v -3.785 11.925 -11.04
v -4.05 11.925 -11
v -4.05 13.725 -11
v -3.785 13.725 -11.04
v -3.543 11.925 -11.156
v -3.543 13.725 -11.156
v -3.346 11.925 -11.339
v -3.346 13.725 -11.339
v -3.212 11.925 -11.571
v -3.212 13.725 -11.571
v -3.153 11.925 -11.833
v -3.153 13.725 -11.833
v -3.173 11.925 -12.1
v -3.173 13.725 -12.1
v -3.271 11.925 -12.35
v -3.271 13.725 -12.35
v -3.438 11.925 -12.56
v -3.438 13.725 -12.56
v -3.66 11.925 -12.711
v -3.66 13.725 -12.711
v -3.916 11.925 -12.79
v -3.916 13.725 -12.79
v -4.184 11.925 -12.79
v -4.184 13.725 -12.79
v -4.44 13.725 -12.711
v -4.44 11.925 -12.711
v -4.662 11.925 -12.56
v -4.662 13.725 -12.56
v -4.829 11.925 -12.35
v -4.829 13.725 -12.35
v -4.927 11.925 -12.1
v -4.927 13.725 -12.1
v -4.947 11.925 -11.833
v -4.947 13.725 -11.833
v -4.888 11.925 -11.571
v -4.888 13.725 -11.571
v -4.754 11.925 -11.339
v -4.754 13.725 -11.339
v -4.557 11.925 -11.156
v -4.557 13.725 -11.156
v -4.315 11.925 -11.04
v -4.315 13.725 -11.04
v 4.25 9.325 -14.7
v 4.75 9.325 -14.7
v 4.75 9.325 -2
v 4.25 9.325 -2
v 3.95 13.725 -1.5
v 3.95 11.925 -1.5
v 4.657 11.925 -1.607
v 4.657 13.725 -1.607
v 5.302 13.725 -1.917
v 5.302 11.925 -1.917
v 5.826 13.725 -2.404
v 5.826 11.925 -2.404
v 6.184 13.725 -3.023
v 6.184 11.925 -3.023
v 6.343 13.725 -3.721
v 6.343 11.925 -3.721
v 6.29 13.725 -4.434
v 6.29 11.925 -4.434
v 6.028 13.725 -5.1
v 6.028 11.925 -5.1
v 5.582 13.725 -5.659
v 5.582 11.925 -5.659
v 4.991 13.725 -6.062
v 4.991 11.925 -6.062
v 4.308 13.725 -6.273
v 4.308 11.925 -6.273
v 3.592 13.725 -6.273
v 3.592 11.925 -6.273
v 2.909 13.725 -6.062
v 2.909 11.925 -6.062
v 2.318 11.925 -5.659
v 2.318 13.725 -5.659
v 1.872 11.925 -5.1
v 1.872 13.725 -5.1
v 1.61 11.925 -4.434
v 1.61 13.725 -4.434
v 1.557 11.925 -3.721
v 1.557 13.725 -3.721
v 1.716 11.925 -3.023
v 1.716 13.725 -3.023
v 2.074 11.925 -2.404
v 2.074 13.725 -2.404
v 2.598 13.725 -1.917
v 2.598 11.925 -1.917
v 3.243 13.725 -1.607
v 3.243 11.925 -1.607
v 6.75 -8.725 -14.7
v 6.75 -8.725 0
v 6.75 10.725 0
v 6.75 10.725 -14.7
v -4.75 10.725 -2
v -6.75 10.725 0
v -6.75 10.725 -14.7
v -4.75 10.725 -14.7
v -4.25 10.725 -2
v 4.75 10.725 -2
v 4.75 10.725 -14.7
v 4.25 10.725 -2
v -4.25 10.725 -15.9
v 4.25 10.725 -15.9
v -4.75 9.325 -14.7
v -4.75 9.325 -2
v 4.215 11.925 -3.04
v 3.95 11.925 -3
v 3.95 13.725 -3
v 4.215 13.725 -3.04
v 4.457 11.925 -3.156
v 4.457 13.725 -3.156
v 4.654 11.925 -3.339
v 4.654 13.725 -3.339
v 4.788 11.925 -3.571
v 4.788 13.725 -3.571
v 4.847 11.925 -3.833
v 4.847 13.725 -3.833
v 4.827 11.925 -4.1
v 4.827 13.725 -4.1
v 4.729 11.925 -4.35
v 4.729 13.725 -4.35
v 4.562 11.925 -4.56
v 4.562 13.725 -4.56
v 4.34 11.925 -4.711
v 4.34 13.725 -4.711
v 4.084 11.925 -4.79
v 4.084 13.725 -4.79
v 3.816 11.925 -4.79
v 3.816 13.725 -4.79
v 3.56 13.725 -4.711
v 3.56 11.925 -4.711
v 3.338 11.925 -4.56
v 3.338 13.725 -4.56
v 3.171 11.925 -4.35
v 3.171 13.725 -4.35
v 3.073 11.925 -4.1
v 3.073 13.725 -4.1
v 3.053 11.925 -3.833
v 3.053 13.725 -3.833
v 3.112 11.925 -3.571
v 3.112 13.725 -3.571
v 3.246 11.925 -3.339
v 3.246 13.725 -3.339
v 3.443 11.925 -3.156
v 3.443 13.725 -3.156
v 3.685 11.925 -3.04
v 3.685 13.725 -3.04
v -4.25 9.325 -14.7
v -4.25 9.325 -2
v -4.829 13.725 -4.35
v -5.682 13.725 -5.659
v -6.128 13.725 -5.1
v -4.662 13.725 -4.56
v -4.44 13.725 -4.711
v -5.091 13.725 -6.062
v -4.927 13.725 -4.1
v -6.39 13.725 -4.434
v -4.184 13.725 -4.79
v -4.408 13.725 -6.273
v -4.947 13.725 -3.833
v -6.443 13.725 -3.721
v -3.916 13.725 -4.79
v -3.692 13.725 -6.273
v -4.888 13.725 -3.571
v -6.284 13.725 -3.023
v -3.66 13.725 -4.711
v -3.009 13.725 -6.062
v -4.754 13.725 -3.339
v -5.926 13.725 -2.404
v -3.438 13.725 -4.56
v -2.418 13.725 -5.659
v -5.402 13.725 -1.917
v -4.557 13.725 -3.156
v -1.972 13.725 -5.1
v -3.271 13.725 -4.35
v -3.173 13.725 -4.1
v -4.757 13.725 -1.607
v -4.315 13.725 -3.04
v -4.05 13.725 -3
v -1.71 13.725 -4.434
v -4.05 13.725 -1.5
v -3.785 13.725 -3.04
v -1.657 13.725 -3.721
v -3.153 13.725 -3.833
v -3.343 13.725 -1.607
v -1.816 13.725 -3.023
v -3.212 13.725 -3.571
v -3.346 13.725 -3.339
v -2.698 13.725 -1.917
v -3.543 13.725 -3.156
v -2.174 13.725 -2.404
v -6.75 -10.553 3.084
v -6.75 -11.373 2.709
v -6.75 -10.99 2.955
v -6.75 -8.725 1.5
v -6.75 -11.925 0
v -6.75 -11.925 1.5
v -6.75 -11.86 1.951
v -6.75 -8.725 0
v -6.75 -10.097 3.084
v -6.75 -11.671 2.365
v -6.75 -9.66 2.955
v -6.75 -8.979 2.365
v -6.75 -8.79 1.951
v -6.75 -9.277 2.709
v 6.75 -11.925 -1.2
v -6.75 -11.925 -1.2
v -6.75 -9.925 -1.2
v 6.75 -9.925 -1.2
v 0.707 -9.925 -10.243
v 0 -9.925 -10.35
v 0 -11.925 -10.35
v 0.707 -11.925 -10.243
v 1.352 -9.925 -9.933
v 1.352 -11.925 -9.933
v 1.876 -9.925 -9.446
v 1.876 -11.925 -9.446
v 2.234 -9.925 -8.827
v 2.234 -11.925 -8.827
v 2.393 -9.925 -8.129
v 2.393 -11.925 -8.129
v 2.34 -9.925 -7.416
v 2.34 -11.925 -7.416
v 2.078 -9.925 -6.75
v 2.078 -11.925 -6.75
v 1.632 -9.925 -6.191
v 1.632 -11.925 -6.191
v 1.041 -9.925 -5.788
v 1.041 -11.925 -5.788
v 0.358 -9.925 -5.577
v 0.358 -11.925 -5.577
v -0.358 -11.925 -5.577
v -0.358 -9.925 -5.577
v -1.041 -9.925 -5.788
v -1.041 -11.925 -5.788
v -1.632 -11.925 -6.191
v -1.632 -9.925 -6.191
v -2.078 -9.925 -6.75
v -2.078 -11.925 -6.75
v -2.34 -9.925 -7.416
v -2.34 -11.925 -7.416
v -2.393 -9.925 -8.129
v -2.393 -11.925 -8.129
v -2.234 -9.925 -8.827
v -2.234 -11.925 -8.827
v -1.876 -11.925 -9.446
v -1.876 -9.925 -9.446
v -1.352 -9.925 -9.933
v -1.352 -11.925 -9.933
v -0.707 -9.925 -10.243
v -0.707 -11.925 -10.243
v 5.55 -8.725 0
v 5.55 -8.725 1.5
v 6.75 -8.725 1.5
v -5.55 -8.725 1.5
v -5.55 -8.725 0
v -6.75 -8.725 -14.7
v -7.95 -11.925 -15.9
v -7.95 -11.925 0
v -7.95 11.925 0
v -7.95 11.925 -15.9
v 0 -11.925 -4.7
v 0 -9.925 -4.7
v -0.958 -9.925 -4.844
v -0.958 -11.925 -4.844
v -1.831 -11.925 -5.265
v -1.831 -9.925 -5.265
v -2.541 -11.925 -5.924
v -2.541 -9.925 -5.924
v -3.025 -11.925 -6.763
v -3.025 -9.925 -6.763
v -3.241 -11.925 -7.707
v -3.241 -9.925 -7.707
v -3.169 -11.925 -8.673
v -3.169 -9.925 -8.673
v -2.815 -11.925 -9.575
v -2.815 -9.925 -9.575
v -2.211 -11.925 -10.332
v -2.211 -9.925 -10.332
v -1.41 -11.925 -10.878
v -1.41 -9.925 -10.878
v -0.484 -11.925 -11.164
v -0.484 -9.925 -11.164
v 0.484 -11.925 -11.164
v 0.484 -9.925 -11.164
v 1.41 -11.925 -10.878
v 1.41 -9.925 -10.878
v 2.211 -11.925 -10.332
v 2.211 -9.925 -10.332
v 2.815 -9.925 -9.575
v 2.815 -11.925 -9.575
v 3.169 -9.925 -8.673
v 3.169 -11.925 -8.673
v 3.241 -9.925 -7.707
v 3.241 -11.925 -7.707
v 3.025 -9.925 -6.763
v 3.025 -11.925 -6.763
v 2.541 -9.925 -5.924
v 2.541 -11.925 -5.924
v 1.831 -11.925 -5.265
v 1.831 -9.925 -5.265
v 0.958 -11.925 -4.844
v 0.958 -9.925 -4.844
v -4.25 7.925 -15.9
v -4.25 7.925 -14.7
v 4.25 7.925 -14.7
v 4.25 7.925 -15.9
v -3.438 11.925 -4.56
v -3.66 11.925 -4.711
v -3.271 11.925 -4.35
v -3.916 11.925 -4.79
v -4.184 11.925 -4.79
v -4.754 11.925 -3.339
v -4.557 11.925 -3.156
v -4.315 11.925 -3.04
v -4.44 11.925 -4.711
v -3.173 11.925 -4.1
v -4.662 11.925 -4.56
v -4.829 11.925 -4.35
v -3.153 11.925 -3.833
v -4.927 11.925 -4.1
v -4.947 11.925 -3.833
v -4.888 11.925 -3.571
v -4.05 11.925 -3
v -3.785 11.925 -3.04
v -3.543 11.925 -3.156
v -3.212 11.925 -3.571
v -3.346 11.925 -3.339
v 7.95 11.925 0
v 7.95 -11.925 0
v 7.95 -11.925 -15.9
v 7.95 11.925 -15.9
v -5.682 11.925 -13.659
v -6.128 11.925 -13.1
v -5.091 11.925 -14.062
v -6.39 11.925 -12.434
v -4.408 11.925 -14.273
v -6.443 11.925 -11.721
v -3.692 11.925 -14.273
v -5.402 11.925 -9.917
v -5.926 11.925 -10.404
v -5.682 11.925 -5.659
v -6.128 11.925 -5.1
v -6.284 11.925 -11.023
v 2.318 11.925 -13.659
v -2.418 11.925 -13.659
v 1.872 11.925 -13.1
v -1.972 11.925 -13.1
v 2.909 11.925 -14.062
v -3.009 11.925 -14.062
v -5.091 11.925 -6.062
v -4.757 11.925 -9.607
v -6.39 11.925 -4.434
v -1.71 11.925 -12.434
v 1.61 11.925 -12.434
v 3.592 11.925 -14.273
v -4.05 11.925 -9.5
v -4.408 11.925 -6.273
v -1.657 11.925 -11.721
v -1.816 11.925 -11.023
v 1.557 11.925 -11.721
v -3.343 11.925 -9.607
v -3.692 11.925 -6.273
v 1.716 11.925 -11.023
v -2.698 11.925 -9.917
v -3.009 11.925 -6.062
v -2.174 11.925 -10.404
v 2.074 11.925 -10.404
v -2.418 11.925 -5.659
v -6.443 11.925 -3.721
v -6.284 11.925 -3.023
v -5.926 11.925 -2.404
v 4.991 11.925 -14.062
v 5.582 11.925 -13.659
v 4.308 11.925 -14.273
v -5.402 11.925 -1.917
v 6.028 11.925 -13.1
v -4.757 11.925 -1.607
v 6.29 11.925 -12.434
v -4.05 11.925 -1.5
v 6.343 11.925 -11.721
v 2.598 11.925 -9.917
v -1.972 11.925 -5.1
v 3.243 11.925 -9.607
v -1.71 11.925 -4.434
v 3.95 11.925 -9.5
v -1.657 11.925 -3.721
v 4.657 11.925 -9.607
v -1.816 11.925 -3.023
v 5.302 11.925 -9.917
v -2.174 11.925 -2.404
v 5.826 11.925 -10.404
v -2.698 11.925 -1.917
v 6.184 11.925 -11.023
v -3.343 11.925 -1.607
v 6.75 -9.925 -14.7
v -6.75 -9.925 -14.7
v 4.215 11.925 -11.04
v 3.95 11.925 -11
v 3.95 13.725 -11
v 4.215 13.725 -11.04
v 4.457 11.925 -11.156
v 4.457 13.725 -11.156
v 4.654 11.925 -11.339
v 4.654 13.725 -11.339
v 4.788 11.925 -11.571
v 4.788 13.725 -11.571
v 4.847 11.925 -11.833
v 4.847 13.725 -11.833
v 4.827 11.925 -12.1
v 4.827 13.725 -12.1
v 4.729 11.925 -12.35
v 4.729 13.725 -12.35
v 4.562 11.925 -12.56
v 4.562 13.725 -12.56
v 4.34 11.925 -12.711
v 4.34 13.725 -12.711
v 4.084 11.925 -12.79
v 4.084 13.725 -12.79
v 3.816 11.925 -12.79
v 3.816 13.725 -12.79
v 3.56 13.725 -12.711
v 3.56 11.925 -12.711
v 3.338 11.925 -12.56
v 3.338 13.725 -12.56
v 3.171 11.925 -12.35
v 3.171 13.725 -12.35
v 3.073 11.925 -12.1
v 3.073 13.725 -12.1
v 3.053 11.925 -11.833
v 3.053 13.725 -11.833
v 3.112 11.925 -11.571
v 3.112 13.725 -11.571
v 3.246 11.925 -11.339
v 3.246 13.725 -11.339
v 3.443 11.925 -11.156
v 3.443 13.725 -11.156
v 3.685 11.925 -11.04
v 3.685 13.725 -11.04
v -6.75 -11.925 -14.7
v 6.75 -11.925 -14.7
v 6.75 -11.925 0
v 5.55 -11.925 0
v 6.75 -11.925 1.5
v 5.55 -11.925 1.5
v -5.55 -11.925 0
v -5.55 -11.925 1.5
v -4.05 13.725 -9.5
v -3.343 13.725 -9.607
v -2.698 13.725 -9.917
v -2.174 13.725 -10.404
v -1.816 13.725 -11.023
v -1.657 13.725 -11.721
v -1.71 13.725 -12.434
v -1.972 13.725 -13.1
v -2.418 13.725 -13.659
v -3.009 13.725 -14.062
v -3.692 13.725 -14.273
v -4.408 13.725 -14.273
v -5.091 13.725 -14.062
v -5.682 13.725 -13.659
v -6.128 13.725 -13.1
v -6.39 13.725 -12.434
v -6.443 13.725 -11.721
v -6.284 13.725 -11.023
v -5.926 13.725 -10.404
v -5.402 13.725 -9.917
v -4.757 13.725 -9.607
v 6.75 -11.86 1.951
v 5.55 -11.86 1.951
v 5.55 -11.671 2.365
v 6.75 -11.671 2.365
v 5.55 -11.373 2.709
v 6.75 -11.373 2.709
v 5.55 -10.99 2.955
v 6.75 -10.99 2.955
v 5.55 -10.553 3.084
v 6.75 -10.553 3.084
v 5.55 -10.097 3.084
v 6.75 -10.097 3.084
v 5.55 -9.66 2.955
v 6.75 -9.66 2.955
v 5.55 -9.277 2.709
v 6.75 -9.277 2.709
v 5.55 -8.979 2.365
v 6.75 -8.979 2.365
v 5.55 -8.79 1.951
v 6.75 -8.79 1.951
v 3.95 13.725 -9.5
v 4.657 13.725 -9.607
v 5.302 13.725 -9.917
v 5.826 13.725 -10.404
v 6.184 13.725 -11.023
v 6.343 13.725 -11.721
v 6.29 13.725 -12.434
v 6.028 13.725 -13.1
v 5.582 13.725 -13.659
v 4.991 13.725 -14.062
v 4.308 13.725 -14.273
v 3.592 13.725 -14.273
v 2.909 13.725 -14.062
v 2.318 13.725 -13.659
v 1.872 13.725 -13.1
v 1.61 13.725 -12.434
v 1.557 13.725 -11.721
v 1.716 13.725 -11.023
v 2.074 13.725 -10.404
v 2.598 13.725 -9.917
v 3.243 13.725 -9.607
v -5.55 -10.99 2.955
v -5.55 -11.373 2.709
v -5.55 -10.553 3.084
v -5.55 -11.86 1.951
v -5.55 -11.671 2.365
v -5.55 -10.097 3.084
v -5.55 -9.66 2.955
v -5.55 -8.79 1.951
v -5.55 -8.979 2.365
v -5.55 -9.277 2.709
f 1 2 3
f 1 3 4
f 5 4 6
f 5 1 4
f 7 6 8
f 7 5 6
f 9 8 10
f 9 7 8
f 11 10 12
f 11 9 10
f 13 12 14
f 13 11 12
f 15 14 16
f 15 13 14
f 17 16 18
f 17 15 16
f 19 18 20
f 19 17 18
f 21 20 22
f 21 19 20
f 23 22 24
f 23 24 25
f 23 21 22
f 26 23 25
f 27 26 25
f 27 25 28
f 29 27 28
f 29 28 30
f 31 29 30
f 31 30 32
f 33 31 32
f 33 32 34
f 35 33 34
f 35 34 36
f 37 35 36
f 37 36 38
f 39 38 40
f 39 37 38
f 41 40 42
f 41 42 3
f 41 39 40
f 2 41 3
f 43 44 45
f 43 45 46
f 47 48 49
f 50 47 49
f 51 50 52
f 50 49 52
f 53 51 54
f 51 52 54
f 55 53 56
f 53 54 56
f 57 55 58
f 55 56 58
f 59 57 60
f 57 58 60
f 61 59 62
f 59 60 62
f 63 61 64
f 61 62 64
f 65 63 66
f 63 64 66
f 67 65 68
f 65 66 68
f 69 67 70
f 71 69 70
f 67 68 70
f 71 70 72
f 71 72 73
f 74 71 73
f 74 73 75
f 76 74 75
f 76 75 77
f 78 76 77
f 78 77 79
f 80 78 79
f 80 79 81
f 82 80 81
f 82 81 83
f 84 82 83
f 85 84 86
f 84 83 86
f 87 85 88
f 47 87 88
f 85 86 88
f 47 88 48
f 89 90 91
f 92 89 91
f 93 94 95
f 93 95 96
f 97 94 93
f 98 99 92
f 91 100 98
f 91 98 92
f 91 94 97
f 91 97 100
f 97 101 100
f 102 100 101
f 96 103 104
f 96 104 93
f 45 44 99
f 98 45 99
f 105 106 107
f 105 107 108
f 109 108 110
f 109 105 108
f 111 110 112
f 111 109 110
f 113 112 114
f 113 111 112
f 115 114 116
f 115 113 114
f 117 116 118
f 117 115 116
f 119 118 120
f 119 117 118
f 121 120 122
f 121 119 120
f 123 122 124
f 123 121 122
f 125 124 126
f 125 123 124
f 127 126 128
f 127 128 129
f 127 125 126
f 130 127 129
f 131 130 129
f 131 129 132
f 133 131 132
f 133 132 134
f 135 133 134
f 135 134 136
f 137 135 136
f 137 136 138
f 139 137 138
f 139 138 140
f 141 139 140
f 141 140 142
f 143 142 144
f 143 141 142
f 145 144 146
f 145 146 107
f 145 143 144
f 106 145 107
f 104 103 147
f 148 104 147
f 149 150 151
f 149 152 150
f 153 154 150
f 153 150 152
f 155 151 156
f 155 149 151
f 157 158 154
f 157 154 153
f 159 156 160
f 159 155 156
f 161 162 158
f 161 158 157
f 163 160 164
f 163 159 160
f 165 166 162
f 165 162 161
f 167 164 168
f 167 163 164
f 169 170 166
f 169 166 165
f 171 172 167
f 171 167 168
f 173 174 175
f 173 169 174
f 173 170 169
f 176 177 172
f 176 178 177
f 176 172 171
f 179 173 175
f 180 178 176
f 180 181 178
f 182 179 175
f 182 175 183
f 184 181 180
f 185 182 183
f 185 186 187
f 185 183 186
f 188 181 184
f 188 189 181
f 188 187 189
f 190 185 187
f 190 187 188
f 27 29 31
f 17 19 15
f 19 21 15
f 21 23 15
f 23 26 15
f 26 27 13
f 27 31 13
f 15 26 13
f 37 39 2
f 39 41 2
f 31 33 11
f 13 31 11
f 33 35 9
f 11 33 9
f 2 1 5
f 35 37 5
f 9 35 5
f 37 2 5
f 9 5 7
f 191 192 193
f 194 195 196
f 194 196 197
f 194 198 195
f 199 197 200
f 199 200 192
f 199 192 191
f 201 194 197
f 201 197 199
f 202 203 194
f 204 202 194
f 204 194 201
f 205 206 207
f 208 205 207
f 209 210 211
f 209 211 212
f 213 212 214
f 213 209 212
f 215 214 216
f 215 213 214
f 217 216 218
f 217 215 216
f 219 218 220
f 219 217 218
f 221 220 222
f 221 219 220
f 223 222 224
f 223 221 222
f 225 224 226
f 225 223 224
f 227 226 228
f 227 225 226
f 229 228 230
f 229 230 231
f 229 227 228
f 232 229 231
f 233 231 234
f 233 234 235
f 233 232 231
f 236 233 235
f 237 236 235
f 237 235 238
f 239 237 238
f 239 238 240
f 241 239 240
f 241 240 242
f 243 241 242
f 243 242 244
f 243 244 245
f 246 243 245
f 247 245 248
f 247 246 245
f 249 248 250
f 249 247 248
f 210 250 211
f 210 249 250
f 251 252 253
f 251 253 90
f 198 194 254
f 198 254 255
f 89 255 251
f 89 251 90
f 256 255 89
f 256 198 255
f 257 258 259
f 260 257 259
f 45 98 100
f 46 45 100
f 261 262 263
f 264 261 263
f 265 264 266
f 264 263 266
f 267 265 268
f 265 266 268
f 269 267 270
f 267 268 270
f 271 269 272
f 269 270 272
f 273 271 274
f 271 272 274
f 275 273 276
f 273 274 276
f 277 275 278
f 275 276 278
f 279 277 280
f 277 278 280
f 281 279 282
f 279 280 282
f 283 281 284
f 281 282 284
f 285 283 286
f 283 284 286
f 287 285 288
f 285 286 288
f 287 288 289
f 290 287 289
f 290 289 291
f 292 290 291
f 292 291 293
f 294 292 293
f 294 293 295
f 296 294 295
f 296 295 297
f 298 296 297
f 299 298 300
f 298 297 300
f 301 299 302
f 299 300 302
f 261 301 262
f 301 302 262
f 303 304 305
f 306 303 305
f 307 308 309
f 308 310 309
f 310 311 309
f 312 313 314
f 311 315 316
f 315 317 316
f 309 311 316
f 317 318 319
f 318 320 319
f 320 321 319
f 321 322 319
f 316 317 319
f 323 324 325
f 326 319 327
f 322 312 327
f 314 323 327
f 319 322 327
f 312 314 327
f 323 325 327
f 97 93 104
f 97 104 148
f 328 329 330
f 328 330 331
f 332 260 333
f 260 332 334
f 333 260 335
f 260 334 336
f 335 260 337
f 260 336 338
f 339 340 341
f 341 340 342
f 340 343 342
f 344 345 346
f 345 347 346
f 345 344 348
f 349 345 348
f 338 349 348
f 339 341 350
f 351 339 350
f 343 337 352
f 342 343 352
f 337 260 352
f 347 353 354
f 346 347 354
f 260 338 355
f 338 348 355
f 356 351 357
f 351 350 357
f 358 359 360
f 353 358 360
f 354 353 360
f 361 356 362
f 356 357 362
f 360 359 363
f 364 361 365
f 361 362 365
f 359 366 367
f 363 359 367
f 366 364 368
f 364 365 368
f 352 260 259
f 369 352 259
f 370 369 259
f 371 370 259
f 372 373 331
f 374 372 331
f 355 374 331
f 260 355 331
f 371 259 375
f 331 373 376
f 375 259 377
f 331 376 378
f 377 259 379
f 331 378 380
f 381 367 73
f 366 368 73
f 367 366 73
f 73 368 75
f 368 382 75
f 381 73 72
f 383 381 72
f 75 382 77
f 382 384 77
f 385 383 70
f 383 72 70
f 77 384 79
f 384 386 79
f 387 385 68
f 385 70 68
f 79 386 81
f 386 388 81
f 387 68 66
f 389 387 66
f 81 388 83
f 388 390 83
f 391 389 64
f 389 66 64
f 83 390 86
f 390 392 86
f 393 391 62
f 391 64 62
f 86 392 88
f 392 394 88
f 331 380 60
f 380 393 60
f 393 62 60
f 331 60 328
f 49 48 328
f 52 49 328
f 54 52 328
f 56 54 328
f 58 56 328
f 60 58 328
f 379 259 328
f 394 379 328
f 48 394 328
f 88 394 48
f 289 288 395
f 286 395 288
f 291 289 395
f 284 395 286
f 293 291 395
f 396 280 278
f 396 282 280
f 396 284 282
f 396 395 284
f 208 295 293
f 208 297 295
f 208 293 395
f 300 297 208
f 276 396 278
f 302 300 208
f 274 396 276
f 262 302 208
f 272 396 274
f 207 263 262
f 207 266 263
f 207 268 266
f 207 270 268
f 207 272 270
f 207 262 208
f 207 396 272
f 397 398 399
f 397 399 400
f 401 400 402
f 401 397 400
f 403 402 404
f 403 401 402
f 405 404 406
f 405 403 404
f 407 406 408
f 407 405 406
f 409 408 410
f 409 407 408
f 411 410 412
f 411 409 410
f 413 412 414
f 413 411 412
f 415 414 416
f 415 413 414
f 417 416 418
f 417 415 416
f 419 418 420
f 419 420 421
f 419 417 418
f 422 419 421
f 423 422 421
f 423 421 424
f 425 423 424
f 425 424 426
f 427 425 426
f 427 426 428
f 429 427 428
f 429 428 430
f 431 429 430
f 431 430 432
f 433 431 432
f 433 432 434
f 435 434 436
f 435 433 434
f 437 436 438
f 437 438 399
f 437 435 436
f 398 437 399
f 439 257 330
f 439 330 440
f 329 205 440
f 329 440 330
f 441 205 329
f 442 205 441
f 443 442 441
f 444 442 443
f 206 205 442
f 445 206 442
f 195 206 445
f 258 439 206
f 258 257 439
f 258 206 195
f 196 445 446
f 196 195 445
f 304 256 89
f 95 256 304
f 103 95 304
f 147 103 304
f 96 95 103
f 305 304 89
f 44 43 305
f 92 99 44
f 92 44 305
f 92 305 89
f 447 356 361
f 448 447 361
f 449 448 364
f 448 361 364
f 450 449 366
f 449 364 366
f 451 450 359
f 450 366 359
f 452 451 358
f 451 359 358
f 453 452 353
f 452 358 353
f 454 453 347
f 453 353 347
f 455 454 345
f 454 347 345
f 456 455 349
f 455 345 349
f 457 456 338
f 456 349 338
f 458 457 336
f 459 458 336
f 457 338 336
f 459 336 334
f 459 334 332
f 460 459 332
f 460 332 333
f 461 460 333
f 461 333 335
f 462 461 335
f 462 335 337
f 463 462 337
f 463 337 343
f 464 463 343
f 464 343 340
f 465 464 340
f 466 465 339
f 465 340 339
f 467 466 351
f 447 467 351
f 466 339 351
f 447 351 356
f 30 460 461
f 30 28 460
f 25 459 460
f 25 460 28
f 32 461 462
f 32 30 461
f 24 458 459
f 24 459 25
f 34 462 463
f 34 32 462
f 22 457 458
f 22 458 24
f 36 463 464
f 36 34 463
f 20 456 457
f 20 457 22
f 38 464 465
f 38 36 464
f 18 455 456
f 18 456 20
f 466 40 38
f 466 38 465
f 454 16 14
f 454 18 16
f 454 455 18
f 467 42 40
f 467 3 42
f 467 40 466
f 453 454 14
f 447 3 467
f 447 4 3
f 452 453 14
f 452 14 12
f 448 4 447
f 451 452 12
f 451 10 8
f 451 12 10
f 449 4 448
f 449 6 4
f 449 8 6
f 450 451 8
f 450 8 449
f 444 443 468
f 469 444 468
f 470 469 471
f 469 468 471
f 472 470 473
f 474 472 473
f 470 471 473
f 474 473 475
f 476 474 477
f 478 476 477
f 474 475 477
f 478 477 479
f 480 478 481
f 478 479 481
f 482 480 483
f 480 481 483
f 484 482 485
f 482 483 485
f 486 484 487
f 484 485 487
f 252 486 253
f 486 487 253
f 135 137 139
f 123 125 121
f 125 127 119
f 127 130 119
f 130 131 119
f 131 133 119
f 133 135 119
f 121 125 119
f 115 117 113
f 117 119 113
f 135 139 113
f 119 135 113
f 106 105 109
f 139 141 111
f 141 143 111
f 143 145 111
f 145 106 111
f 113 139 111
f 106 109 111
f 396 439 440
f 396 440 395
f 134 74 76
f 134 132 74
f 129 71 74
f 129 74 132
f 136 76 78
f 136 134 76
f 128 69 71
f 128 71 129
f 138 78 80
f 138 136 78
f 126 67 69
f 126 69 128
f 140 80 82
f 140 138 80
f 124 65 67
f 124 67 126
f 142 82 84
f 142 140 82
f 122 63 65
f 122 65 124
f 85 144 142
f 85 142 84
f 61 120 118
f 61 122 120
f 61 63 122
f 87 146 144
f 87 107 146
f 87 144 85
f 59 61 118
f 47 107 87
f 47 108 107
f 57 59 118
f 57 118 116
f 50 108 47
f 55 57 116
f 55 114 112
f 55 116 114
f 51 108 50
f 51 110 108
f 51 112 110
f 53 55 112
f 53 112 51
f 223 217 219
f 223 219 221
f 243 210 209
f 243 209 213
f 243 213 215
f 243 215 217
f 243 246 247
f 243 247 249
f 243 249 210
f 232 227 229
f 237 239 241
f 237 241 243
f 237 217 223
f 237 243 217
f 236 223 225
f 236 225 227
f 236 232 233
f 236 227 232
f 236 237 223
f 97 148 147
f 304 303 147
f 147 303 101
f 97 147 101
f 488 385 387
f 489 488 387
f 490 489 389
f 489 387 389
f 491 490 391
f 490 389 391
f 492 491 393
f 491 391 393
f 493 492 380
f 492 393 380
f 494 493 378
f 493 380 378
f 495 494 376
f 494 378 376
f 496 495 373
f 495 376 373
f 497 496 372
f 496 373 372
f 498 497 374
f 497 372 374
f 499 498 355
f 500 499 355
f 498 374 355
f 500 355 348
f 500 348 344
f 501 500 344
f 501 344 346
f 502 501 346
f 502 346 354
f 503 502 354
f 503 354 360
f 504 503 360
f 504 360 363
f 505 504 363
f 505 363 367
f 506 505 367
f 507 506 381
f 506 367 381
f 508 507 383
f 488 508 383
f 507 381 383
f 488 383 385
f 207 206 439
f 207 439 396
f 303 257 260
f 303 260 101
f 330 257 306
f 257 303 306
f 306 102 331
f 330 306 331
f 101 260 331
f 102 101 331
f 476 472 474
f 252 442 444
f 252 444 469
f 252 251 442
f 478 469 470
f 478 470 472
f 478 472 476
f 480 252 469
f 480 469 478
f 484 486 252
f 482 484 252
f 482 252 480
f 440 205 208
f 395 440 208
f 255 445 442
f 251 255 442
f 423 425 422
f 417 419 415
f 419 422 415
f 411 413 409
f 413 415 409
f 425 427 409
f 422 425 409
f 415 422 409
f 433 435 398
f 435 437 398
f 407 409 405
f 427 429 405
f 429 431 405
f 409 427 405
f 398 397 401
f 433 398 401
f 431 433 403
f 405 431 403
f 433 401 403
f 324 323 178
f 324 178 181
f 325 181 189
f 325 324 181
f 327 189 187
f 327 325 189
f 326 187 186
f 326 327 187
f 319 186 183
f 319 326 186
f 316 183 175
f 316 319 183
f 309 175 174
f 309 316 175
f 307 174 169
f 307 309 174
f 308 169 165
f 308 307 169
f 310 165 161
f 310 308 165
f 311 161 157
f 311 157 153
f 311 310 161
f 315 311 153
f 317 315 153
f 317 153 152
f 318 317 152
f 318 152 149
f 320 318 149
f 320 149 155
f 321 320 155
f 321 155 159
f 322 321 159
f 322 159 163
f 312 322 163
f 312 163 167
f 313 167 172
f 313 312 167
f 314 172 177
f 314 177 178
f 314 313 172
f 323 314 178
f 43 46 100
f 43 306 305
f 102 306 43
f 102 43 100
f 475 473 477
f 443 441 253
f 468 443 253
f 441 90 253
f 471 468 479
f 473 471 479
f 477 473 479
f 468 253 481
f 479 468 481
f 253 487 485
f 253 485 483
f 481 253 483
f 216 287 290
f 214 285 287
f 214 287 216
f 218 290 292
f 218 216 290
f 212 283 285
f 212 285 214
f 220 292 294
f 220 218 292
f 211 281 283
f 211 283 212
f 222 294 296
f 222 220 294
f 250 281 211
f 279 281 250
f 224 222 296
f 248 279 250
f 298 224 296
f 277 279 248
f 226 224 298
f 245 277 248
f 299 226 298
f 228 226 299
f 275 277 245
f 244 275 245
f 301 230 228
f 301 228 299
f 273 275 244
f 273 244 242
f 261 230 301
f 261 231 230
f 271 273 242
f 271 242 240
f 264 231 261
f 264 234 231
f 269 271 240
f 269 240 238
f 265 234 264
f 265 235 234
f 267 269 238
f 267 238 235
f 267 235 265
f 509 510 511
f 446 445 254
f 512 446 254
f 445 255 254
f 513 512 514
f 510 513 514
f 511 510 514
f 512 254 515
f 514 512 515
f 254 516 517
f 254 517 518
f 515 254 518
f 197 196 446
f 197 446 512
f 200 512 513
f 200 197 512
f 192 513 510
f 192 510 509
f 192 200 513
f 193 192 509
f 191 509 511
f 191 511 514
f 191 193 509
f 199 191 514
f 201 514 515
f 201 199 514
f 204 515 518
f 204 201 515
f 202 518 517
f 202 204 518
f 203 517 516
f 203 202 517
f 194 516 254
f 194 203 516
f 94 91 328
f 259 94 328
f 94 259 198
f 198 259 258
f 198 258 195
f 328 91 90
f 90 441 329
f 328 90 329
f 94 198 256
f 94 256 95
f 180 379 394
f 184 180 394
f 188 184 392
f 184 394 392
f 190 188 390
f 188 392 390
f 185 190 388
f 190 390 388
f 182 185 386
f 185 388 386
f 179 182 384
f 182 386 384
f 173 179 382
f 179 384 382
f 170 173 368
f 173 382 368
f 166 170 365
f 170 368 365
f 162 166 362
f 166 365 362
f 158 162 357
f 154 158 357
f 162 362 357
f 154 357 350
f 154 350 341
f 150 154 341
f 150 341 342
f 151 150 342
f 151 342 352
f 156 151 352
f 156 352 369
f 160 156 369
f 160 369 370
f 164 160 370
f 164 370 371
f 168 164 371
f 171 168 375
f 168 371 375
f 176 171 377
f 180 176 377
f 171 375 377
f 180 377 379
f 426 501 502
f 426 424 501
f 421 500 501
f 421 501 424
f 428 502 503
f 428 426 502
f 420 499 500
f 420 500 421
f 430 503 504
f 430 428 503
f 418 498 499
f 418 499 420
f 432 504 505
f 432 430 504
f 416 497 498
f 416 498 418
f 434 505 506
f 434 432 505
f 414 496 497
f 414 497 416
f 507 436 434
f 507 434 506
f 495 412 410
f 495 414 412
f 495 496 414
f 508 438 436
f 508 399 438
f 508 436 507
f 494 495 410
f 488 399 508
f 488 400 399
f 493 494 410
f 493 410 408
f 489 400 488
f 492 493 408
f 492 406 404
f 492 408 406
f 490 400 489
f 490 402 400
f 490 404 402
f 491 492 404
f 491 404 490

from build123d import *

# Parameters (mm, degrees)
SKETCH1_W            = 15.9
SKETCH1_H            = 23.85
BOSS_EXTRUDE1_DEPTH  = 15.9
SHELL2_T             = -1.2
SKETCH7_W            = 13.5
SKETCH7_H            = 14.7
BOSS_EXTRUDE4_DEPTH  = 2
SHELL3_START         = -6.75
SHELL3_OUTLINE_W     = 2
SHELL3_OUTLINE_H     = 13.5
SHELL3_DEPTH         = 13.5
BOSS_EXTRUDE3_DEPTH  = 1.2
SKETCH8_W            = 8.5
SKETCH8_H            = 2.8
CUT_EXTRUDE2_DEPTH   = 23.852748741
SKETCH9_W            = 0.5
SKETCH9_H            = 1.4
BOSS_EXTRUDE5_DEPTH  = 12.7
SKETCH10_R           = 3.25
SKETCH10_R_2         = 2.4
BOSS_EXTRUDE6_DEPTH  = 2
SKETCH11_R           = 2.4
SKETCH11_R_2         = 0.9
BOSS_EXTRUDE7_DEPTH  = 1.8
LPATTERN1_COUNT      = 2
LPATTERN1_PITCH      = 8
LPATTERN1_COUNT_DIR2 = 2
LPATTERN1_PITCH_DIR2 = 8


# Read off the part's stored shape, not the designer's step: Shell3
with BuildPart() as part:
    # Sketch1 → Boss-Extrude1 (new body)
    with BuildSketch(Plane.XY):
        Rectangle(SKETCH1_W, SKETCH1_H)
    extrude(amount=-BOSS_EXTRUDE1_DEPTH)

    # Shell2
    shell2_openings = [part.faces().sort_by_distance(p)[0] for p in [
        (0, 0, 0),
    ]]
    offset(amount=SHELL2_T, openings=shell2_openings, kind=Kind.INTERSECTION)

    # Sketch7 → Boss-Extrude4 (add)
    with BuildSketch(Plane(origin=(0, -10.725, 0), x_dir=(1, 0, 0), z_dir=(0, 1, 0))):
        with Locations((0, 7.35)):
            Rectangle(SKETCH7_W, SKETCH7_H)
    extrude(amount=BOSS_EXTRUDE4_DEPTH)

    # Shell3 outline → Shell3 (cut)
    with BuildSketch(Plane.YZ.offset(SHELL3_START)):
        with Locations((-10.925, -7.95)):
            Rectangle(SHELL3_OUTLINE_W, SHELL3_OUTLINE_H)
    extrude(amount=SHELL3_DEPTH, mode=Mode.SUBTRACT)

    # Sketch5 → Boss-Extrude3 (add)
    with BuildSketch(Plane(origin=(6.75, 0, 0), x_dir=(0, 0, -1), z_dir=(1, 0, 0))):
        with BuildLine():
            Line((0, -11.925), (-1.5, -11.925))
            ThreePointArc((-1.5, -11.925), (-3.1, -10.325), (-1.5, -8.725))
            Line((-1.5, -8.725), (0, -8.725))
            Line((0, -8.725), (0, -11.925))
        make_face()
    boss_extrude3 = extrude(amount=-BOSS_EXTRUDE3_DEPTH)

    # Mirror2: Boss-Extrude3 across plane
    add(boss_extrude3.mirror(Plane(origin=(0, 0, 0), x_dir=(0, 0, 1), z_dir=(1, 0, 0))))

    # Sketch8 → Cut-Extrude2 (cut, through all)
    with BuildSketch(Plane.XY.offset(-14.7)):
        with Locations((0, 9.325)):
            Rectangle(SKETCH8_W, SKETCH8_H)
    extrude(amount=-CUT_EXTRUDE2_DEPTH, mode=Mode.SUBTRACT)

    # Sketch9 → Boss-Extrude5 (add)
    with BuildSketch(Plane.XY.offset(-14.7)):
        with Locations((-4.5, 10.025)):
            Rectangle(SKETCH9_W, SKETCH9_H)
    boss_extrude5 = extrude(amount=BOSS_EXTRUDE5_DEPTH)

    # Mirror3: Boss-Extrude5 across plane
    add(boss_extrude5.mirror(Plane(origin=(0, 0, 0), x_dir=(0, 0, 1), z_dir=(1, 0, 0))))

    # Sketch10 → Boss-Extrude6 (add)
    with BuildSketch(Plane.XZ.offset(9.925)):
        with Locations(Location((0, -7.95, 0), (0, 0, 90))):
            Circle(SKETCH10_R)
        with Locations(Location((0, -7.95, 0), (0, 0, 270))):
            Circle(SKETCH10_R_2, mode=Mode.SUBTRACT)
    extrude(amount=BOSS_EXTRUDE6_DEPTH)

    # Sketch11 → Boss-Extrude7 (add)
    with BuildSketch(Plane(origin=(0, 11.925, 0), x_dir=(1, 0, 0), z_dir=(0, 1, 0))):
        with Locations(Location((-4.05, 3.9, 0), (0, 0, 270))):
            Circle(SKETCH11_R)
        with Locations(Location((-4.05, 3.9, 0), (0, 0, 270))):
            Circle(SKETCH11_R_2, mode=Mode.SUBTRACT)
    boss_extrude7 = extrude(amount=BOSS_EXTRUDE7_DEPTH)

    # LPattern1: Boss-Extrude7 2 × 2
    with Locations(*[(i * LPATTERN1_PITCH, 0, -j * LPATTERN1_PITCH_DIR2) for i in range(LPATTERN1_COUNT) for j in range(LPATTERN1_COUNT_DIR2) if (i, j) != (0, 0)]):
        add(boss_extrude7)


solid = part.part
